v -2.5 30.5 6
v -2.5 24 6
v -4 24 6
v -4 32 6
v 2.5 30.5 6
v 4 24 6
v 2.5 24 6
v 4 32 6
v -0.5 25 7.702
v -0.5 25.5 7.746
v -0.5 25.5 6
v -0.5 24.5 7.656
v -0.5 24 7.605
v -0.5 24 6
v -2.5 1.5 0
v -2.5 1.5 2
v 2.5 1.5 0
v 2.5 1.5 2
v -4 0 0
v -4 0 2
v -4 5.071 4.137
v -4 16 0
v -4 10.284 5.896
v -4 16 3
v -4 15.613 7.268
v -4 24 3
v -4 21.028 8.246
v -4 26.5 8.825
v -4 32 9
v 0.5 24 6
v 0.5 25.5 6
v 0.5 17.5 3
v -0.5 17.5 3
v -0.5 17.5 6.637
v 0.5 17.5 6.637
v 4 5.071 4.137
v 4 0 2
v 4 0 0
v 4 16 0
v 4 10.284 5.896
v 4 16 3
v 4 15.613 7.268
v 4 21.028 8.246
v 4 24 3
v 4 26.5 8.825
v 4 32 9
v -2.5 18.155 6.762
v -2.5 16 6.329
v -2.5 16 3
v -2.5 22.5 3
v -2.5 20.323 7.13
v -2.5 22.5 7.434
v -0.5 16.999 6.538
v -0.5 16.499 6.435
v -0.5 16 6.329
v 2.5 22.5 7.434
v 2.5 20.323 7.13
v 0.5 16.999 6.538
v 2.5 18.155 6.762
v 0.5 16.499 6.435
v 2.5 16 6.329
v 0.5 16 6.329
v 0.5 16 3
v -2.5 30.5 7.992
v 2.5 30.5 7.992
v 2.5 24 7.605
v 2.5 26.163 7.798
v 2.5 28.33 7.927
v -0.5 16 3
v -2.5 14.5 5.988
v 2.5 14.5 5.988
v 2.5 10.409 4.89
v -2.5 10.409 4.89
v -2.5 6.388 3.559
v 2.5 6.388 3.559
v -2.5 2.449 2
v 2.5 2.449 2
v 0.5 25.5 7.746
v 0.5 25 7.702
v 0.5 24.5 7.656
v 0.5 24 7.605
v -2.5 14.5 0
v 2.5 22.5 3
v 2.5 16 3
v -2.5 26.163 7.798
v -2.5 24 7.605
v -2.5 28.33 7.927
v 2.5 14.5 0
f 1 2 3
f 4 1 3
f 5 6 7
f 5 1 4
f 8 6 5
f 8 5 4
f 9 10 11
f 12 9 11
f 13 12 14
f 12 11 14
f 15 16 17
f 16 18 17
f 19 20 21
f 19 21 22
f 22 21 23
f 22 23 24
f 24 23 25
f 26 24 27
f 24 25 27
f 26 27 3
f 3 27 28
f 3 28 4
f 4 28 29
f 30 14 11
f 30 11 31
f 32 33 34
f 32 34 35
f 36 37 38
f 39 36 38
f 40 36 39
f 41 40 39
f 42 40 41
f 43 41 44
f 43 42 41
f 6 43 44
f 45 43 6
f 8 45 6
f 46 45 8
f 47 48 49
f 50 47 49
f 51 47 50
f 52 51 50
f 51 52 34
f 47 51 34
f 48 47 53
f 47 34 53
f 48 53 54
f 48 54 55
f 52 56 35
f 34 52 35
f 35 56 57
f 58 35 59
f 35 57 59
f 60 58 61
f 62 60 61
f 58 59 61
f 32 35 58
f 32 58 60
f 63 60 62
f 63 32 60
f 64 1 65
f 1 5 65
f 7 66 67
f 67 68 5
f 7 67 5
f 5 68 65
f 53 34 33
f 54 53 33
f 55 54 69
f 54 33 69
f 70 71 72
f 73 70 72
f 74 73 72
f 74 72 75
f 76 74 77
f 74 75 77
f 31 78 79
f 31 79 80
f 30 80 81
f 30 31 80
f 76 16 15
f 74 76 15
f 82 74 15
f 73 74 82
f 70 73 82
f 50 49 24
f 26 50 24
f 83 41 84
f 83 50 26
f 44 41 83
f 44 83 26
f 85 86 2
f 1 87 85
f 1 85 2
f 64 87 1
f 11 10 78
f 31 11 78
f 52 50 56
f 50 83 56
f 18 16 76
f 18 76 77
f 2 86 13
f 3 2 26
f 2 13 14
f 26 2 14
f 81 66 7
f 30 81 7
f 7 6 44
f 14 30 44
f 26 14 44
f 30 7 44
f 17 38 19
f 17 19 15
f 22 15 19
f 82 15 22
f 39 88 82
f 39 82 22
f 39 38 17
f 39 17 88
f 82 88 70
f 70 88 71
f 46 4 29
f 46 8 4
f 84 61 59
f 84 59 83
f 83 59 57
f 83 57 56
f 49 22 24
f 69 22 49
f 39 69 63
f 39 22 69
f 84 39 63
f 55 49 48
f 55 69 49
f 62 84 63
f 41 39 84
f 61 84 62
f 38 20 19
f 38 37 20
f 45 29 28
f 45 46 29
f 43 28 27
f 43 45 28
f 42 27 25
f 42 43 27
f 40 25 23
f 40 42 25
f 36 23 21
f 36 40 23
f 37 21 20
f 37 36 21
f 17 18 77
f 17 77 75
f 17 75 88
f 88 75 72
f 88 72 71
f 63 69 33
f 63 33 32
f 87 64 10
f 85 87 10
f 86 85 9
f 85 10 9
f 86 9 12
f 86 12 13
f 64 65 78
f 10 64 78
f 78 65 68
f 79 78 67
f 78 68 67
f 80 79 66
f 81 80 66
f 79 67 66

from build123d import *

# Parameters (mm, degrees)
F1_DEPTH = 4
F2_DEPTH = 2.5
F4_W     = 1
F4_H     = 1.5
F6_W     = 1
F6_H     = 1.5
F8_W     = 5
F8_H     = 5
F9_DEPTH = 2


with BuildPart() as f1:
    # F0 (on Right) → F1 (new body)
    with BuildSketch(Plane.YZ):
        with BuildLine():
            Line((0, 2), (0, 0))
            Line((0, 0), (1.5, 0))
            Line((1.5, 0), (1.5, 1.5845440408))
            ThreePointArc((1.5, 1.5845440408), (7.8976750419, 4.0885304442), (14.5, 5.9883985969))
            Line((14.5, 5.9883985969), (14.5, 0))
            Line((14.5, 0), (16, 0))
            Line((16, 0), (16, 3))
            Line((16, 3), (16, 6.3291188198))
            ThreePointArc((16, 6.3291188198), (19.2376865014, 6.9540783828), (22.5, 7.4341814697))
            Line((22.5, 7.4341814697), (22.5, 3))
            Line((22.5, 3), (24, 3))
            Line((24, 3), (24, 6))
            Line((24, 6), (24, 7.6053708135))
            ThreePointArc((24, 7.6053708135), (27.2457445405, 7.8702512613), (30.5, 7.9920735832))
            Line((30.5, 7.9920735832), (30.5, 6))
            Line((30.5, 6), (32, 6))
            Line((32, 6), (32, 9))
            ThreePointArc((32, 9), (15.6131705465, 7.2683632159), (0, 2))
        make_face()
        with BuildLine():
            Line((1.5, 1.5845440408), (1.5, 0))
            Line((1.5, 0), (14.5, 0))
            Line((14.5, 0), (14.5, 5.9883985969))
            ThreePointArc((14.5, 5.9883985969), (7.8976750419, 4.0885304442), (1.5, 1.5845440408))
        make_face()
        with BuildLine():
            Line((16, 6.3291188198), (16, 3))
            Line((16, 3), (22.5, 3))
            Line((22.5, 3), (22.5, 7.4341814697))
            ThreePointArc((22.5, 7.4341814697), (19.2376865014, 6.9540783828), (16, 6.3291188198))
        make_face()
        with BuildLine():
            Line((24, 6), (30.5, 6))
            Line((30.5, 6), (30.5, 7.9920735832))
            ThreePointArc((30.5, 7.9920735832), (27.2457445405, 7.8702512613), (24, 7.6053708135))
            Line((24, 7.6053708135), (24, 6))
        make_face()
    extrude(amount=F1_DEPTH)

    # F0 (on Right) → F2 (cut)
    with BuildSketch(Plane.YZ):
        with BuildLine():
            Line((24, 6), (30.5, 6))
            Line((30.5, 6), (30.5, 7.9920735832))
            ThreePointArc((30.5, 7.9920735832), (27.2457445405, 7.8702512613), (24, 7.6053708135))
            Line((24, 7.6053708135), (24, 6))
        make_face()
        with BuildLine():
            Line((16, 6.3291188198), (16, 3))
            Line((16, 3), (22.5, 3))
            Line((22.5, 3), (22.5, 7.4341814697))
            ThreePointArc((22.5, 7.4341814697), (19.2376865014, 6.9540783828), (16, 6.3291188198))
        make_face()
        with BuildLine():
            Line((1.5, 1.5845440408), (1.5, 0))
            Line((1.5, 0), (14.5, 0))
            Line((14.5, 0), (14.5, 5.9883985969))
            ThreePointArc((14.5, 5.9883985969), (7.8976750419, 4.0885304442), (1.5, 1.5845440408))
        make_face()
    extrude(amount=F2_DEPTH, mode=Mode.SUBTRACT)

    # F3: F1 across face


with BuildPart() as f1_1:
    add(f1.part)
    add(f1.part.mirror(Plane(origin=(0, 16.947812772, 5.3752677136), x_dir=(0, 1, 0), z_dir=(-1, 0, 0))))

    # F4 (on face) → F5 (join, up to the next surface of F1)
    with BuildSketch(Plane(origin=(0, 0, 6), x_dir=(1, 0, 0), z_dir=(0, 0, -1))):
        with Locations((0, -24.75)):
            Rectangle(F4_W, F4_H)
    extrude(until=Until.NEXT, dir=(0, 0, 1))

    # F6 (on face) → F7 (join, up to the next surface of F1)
    with BuildSketch(Plane(origin=(0, 0, 3), x_dir=(1, 0, 0), z_dir=(0, 0, -1))):
        with Locations((0, -16.75)):
            Rectangle(F6_W, F6_H)
    extrude(until=Until.NEXT, dir=(0, 0, 1))

    # F8 (on face) → F9 (cut)
    with BuildSketch(Plane(origin=(0, 0, 0), x_dir=(1, 0, 0), z_dir=(0, 0, -1))):
        with Locations((0, -4)):
            Rectangle(F8_W, F8_H)
    extrude(amount=-F9_DEPTH, mode=Mode.SUBTRACT)


solid = f1_1.part
